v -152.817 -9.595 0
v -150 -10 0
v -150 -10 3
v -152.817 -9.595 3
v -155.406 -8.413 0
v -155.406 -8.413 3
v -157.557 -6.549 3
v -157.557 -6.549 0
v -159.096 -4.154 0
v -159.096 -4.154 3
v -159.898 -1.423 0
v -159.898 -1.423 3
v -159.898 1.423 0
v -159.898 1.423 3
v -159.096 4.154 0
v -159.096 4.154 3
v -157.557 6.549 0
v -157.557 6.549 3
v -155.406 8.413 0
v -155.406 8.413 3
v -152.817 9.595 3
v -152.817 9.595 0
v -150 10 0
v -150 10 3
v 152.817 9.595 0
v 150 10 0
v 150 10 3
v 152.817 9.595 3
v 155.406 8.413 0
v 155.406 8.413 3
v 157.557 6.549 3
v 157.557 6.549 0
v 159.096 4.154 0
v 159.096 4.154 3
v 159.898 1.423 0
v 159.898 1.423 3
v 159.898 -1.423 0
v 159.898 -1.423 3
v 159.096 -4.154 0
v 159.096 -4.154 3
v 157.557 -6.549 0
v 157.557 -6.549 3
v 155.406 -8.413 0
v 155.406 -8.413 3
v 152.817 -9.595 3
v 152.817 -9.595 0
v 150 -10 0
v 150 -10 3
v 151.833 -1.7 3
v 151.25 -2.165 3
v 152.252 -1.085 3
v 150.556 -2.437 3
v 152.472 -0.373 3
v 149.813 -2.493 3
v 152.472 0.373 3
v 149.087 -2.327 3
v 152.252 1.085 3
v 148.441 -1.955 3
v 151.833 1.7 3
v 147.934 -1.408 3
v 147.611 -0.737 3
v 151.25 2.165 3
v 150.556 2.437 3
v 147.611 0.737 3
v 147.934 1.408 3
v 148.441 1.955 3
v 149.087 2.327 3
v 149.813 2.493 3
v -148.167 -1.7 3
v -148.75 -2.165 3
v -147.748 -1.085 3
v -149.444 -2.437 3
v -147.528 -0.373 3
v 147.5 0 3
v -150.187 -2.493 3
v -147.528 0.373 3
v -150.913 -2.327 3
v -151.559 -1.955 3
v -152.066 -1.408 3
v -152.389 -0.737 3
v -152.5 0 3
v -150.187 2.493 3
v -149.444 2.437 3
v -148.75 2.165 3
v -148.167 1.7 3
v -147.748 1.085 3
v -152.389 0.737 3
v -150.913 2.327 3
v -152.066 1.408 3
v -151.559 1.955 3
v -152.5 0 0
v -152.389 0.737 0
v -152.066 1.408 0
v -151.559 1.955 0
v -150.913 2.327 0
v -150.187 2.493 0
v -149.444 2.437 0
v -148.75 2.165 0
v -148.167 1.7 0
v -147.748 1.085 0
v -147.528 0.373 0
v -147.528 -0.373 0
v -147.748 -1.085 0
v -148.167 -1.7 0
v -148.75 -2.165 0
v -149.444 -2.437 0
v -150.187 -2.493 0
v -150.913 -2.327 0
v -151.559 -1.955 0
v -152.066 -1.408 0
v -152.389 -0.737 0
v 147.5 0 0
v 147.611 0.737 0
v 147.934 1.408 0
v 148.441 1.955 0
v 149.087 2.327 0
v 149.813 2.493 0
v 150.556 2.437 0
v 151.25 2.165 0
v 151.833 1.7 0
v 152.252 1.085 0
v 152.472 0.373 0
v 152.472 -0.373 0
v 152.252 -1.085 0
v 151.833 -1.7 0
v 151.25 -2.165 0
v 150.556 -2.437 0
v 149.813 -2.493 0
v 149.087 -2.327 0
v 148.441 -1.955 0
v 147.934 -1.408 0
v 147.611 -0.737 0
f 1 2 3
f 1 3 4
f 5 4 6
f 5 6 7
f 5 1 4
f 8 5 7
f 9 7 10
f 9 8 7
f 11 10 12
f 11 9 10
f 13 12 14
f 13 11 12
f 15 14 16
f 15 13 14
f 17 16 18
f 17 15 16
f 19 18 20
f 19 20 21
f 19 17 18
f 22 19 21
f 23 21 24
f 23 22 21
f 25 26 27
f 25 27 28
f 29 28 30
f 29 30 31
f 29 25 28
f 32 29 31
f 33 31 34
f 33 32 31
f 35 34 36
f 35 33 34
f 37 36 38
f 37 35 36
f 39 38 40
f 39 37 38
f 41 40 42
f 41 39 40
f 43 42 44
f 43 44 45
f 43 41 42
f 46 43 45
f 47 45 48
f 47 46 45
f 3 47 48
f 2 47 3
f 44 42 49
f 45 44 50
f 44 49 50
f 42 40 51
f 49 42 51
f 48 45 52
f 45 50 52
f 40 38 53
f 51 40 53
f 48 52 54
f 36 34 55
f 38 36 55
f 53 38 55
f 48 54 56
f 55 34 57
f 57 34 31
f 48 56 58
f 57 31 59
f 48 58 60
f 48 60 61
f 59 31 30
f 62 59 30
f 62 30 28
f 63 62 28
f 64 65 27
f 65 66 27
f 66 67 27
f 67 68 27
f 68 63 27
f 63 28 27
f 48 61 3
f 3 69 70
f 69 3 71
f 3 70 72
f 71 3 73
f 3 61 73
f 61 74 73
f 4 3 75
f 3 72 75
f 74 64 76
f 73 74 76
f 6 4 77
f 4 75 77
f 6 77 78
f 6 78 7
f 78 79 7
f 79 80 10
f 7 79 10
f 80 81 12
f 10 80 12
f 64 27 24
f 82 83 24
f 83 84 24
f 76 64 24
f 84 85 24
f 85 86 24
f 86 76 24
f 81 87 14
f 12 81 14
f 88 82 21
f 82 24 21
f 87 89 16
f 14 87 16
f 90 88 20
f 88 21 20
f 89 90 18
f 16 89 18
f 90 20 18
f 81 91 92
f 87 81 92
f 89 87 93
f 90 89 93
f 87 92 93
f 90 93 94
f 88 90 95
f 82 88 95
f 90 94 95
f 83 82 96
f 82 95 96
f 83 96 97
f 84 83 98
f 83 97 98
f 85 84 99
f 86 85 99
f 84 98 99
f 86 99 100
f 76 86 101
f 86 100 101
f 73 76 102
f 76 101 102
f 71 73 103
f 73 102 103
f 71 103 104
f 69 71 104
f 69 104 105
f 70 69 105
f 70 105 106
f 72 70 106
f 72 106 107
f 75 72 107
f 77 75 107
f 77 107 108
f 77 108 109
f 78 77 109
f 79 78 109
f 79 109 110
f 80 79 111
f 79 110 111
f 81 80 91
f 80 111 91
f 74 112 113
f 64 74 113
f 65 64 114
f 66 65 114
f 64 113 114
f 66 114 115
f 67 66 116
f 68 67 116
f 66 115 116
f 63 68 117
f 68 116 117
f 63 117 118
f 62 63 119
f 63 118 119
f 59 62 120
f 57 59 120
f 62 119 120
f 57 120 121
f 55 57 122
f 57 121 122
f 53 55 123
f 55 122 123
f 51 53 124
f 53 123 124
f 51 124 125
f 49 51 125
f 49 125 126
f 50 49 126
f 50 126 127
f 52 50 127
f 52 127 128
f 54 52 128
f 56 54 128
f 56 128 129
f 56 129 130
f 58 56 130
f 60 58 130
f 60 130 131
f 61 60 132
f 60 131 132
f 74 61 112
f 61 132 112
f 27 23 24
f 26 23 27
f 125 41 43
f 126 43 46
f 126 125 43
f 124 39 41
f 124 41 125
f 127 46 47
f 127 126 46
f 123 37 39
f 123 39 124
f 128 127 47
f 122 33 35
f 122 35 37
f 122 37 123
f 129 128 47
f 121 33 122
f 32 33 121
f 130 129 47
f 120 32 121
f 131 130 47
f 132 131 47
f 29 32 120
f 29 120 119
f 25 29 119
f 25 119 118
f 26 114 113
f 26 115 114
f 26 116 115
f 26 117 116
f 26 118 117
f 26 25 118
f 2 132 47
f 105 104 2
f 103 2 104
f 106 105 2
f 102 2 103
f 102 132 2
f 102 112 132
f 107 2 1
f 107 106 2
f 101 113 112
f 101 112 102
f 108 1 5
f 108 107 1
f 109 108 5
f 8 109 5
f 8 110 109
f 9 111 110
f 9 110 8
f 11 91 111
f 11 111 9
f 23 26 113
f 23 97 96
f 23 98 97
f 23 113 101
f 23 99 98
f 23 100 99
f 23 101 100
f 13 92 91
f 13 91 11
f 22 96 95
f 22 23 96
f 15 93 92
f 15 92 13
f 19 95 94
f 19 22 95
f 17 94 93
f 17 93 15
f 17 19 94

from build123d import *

# Parameters (mm, degrees)
EXTRUDE_1_DEPTH     = 3
SKETCH_2_R          = 2.5
CUT_EXTRUDE_1_DEPTH = 3


with BuildPart() as part:
    # 草图1 → 凸台-拉伸1 (new body)
    with BuildSketch(Plane.XY):
        with BuildLine():
            Line((-150, 10), (150, 10))
            ThreePointArc((150, 10), (160, 0), (150, -10))
            Line((150, -10), (-150, -10))
            ThreePointArc((-150, -10), (-160, 0), (-150, 10))
        make_face()
    extrude(amount=EXTRUDE_1_DEPTH)

    # 草图2 → 切除-拉伸1 (cut)
    with BuildSketch(Plane(origin=(0, 0, 0), x_dir=(-1, 0, 0), z_dir=(0, 0, -1))):
        with Locations((150, 0)):
            Circle(SKETCH_2_R)
        with Locations((-150, 0)):
            Circle(SKETCH_2_R)
    extrude(amount=-CUT_EXTRUDE_1_DEPTH, mode=Mode.SUBTRACT)


solid = part.part
